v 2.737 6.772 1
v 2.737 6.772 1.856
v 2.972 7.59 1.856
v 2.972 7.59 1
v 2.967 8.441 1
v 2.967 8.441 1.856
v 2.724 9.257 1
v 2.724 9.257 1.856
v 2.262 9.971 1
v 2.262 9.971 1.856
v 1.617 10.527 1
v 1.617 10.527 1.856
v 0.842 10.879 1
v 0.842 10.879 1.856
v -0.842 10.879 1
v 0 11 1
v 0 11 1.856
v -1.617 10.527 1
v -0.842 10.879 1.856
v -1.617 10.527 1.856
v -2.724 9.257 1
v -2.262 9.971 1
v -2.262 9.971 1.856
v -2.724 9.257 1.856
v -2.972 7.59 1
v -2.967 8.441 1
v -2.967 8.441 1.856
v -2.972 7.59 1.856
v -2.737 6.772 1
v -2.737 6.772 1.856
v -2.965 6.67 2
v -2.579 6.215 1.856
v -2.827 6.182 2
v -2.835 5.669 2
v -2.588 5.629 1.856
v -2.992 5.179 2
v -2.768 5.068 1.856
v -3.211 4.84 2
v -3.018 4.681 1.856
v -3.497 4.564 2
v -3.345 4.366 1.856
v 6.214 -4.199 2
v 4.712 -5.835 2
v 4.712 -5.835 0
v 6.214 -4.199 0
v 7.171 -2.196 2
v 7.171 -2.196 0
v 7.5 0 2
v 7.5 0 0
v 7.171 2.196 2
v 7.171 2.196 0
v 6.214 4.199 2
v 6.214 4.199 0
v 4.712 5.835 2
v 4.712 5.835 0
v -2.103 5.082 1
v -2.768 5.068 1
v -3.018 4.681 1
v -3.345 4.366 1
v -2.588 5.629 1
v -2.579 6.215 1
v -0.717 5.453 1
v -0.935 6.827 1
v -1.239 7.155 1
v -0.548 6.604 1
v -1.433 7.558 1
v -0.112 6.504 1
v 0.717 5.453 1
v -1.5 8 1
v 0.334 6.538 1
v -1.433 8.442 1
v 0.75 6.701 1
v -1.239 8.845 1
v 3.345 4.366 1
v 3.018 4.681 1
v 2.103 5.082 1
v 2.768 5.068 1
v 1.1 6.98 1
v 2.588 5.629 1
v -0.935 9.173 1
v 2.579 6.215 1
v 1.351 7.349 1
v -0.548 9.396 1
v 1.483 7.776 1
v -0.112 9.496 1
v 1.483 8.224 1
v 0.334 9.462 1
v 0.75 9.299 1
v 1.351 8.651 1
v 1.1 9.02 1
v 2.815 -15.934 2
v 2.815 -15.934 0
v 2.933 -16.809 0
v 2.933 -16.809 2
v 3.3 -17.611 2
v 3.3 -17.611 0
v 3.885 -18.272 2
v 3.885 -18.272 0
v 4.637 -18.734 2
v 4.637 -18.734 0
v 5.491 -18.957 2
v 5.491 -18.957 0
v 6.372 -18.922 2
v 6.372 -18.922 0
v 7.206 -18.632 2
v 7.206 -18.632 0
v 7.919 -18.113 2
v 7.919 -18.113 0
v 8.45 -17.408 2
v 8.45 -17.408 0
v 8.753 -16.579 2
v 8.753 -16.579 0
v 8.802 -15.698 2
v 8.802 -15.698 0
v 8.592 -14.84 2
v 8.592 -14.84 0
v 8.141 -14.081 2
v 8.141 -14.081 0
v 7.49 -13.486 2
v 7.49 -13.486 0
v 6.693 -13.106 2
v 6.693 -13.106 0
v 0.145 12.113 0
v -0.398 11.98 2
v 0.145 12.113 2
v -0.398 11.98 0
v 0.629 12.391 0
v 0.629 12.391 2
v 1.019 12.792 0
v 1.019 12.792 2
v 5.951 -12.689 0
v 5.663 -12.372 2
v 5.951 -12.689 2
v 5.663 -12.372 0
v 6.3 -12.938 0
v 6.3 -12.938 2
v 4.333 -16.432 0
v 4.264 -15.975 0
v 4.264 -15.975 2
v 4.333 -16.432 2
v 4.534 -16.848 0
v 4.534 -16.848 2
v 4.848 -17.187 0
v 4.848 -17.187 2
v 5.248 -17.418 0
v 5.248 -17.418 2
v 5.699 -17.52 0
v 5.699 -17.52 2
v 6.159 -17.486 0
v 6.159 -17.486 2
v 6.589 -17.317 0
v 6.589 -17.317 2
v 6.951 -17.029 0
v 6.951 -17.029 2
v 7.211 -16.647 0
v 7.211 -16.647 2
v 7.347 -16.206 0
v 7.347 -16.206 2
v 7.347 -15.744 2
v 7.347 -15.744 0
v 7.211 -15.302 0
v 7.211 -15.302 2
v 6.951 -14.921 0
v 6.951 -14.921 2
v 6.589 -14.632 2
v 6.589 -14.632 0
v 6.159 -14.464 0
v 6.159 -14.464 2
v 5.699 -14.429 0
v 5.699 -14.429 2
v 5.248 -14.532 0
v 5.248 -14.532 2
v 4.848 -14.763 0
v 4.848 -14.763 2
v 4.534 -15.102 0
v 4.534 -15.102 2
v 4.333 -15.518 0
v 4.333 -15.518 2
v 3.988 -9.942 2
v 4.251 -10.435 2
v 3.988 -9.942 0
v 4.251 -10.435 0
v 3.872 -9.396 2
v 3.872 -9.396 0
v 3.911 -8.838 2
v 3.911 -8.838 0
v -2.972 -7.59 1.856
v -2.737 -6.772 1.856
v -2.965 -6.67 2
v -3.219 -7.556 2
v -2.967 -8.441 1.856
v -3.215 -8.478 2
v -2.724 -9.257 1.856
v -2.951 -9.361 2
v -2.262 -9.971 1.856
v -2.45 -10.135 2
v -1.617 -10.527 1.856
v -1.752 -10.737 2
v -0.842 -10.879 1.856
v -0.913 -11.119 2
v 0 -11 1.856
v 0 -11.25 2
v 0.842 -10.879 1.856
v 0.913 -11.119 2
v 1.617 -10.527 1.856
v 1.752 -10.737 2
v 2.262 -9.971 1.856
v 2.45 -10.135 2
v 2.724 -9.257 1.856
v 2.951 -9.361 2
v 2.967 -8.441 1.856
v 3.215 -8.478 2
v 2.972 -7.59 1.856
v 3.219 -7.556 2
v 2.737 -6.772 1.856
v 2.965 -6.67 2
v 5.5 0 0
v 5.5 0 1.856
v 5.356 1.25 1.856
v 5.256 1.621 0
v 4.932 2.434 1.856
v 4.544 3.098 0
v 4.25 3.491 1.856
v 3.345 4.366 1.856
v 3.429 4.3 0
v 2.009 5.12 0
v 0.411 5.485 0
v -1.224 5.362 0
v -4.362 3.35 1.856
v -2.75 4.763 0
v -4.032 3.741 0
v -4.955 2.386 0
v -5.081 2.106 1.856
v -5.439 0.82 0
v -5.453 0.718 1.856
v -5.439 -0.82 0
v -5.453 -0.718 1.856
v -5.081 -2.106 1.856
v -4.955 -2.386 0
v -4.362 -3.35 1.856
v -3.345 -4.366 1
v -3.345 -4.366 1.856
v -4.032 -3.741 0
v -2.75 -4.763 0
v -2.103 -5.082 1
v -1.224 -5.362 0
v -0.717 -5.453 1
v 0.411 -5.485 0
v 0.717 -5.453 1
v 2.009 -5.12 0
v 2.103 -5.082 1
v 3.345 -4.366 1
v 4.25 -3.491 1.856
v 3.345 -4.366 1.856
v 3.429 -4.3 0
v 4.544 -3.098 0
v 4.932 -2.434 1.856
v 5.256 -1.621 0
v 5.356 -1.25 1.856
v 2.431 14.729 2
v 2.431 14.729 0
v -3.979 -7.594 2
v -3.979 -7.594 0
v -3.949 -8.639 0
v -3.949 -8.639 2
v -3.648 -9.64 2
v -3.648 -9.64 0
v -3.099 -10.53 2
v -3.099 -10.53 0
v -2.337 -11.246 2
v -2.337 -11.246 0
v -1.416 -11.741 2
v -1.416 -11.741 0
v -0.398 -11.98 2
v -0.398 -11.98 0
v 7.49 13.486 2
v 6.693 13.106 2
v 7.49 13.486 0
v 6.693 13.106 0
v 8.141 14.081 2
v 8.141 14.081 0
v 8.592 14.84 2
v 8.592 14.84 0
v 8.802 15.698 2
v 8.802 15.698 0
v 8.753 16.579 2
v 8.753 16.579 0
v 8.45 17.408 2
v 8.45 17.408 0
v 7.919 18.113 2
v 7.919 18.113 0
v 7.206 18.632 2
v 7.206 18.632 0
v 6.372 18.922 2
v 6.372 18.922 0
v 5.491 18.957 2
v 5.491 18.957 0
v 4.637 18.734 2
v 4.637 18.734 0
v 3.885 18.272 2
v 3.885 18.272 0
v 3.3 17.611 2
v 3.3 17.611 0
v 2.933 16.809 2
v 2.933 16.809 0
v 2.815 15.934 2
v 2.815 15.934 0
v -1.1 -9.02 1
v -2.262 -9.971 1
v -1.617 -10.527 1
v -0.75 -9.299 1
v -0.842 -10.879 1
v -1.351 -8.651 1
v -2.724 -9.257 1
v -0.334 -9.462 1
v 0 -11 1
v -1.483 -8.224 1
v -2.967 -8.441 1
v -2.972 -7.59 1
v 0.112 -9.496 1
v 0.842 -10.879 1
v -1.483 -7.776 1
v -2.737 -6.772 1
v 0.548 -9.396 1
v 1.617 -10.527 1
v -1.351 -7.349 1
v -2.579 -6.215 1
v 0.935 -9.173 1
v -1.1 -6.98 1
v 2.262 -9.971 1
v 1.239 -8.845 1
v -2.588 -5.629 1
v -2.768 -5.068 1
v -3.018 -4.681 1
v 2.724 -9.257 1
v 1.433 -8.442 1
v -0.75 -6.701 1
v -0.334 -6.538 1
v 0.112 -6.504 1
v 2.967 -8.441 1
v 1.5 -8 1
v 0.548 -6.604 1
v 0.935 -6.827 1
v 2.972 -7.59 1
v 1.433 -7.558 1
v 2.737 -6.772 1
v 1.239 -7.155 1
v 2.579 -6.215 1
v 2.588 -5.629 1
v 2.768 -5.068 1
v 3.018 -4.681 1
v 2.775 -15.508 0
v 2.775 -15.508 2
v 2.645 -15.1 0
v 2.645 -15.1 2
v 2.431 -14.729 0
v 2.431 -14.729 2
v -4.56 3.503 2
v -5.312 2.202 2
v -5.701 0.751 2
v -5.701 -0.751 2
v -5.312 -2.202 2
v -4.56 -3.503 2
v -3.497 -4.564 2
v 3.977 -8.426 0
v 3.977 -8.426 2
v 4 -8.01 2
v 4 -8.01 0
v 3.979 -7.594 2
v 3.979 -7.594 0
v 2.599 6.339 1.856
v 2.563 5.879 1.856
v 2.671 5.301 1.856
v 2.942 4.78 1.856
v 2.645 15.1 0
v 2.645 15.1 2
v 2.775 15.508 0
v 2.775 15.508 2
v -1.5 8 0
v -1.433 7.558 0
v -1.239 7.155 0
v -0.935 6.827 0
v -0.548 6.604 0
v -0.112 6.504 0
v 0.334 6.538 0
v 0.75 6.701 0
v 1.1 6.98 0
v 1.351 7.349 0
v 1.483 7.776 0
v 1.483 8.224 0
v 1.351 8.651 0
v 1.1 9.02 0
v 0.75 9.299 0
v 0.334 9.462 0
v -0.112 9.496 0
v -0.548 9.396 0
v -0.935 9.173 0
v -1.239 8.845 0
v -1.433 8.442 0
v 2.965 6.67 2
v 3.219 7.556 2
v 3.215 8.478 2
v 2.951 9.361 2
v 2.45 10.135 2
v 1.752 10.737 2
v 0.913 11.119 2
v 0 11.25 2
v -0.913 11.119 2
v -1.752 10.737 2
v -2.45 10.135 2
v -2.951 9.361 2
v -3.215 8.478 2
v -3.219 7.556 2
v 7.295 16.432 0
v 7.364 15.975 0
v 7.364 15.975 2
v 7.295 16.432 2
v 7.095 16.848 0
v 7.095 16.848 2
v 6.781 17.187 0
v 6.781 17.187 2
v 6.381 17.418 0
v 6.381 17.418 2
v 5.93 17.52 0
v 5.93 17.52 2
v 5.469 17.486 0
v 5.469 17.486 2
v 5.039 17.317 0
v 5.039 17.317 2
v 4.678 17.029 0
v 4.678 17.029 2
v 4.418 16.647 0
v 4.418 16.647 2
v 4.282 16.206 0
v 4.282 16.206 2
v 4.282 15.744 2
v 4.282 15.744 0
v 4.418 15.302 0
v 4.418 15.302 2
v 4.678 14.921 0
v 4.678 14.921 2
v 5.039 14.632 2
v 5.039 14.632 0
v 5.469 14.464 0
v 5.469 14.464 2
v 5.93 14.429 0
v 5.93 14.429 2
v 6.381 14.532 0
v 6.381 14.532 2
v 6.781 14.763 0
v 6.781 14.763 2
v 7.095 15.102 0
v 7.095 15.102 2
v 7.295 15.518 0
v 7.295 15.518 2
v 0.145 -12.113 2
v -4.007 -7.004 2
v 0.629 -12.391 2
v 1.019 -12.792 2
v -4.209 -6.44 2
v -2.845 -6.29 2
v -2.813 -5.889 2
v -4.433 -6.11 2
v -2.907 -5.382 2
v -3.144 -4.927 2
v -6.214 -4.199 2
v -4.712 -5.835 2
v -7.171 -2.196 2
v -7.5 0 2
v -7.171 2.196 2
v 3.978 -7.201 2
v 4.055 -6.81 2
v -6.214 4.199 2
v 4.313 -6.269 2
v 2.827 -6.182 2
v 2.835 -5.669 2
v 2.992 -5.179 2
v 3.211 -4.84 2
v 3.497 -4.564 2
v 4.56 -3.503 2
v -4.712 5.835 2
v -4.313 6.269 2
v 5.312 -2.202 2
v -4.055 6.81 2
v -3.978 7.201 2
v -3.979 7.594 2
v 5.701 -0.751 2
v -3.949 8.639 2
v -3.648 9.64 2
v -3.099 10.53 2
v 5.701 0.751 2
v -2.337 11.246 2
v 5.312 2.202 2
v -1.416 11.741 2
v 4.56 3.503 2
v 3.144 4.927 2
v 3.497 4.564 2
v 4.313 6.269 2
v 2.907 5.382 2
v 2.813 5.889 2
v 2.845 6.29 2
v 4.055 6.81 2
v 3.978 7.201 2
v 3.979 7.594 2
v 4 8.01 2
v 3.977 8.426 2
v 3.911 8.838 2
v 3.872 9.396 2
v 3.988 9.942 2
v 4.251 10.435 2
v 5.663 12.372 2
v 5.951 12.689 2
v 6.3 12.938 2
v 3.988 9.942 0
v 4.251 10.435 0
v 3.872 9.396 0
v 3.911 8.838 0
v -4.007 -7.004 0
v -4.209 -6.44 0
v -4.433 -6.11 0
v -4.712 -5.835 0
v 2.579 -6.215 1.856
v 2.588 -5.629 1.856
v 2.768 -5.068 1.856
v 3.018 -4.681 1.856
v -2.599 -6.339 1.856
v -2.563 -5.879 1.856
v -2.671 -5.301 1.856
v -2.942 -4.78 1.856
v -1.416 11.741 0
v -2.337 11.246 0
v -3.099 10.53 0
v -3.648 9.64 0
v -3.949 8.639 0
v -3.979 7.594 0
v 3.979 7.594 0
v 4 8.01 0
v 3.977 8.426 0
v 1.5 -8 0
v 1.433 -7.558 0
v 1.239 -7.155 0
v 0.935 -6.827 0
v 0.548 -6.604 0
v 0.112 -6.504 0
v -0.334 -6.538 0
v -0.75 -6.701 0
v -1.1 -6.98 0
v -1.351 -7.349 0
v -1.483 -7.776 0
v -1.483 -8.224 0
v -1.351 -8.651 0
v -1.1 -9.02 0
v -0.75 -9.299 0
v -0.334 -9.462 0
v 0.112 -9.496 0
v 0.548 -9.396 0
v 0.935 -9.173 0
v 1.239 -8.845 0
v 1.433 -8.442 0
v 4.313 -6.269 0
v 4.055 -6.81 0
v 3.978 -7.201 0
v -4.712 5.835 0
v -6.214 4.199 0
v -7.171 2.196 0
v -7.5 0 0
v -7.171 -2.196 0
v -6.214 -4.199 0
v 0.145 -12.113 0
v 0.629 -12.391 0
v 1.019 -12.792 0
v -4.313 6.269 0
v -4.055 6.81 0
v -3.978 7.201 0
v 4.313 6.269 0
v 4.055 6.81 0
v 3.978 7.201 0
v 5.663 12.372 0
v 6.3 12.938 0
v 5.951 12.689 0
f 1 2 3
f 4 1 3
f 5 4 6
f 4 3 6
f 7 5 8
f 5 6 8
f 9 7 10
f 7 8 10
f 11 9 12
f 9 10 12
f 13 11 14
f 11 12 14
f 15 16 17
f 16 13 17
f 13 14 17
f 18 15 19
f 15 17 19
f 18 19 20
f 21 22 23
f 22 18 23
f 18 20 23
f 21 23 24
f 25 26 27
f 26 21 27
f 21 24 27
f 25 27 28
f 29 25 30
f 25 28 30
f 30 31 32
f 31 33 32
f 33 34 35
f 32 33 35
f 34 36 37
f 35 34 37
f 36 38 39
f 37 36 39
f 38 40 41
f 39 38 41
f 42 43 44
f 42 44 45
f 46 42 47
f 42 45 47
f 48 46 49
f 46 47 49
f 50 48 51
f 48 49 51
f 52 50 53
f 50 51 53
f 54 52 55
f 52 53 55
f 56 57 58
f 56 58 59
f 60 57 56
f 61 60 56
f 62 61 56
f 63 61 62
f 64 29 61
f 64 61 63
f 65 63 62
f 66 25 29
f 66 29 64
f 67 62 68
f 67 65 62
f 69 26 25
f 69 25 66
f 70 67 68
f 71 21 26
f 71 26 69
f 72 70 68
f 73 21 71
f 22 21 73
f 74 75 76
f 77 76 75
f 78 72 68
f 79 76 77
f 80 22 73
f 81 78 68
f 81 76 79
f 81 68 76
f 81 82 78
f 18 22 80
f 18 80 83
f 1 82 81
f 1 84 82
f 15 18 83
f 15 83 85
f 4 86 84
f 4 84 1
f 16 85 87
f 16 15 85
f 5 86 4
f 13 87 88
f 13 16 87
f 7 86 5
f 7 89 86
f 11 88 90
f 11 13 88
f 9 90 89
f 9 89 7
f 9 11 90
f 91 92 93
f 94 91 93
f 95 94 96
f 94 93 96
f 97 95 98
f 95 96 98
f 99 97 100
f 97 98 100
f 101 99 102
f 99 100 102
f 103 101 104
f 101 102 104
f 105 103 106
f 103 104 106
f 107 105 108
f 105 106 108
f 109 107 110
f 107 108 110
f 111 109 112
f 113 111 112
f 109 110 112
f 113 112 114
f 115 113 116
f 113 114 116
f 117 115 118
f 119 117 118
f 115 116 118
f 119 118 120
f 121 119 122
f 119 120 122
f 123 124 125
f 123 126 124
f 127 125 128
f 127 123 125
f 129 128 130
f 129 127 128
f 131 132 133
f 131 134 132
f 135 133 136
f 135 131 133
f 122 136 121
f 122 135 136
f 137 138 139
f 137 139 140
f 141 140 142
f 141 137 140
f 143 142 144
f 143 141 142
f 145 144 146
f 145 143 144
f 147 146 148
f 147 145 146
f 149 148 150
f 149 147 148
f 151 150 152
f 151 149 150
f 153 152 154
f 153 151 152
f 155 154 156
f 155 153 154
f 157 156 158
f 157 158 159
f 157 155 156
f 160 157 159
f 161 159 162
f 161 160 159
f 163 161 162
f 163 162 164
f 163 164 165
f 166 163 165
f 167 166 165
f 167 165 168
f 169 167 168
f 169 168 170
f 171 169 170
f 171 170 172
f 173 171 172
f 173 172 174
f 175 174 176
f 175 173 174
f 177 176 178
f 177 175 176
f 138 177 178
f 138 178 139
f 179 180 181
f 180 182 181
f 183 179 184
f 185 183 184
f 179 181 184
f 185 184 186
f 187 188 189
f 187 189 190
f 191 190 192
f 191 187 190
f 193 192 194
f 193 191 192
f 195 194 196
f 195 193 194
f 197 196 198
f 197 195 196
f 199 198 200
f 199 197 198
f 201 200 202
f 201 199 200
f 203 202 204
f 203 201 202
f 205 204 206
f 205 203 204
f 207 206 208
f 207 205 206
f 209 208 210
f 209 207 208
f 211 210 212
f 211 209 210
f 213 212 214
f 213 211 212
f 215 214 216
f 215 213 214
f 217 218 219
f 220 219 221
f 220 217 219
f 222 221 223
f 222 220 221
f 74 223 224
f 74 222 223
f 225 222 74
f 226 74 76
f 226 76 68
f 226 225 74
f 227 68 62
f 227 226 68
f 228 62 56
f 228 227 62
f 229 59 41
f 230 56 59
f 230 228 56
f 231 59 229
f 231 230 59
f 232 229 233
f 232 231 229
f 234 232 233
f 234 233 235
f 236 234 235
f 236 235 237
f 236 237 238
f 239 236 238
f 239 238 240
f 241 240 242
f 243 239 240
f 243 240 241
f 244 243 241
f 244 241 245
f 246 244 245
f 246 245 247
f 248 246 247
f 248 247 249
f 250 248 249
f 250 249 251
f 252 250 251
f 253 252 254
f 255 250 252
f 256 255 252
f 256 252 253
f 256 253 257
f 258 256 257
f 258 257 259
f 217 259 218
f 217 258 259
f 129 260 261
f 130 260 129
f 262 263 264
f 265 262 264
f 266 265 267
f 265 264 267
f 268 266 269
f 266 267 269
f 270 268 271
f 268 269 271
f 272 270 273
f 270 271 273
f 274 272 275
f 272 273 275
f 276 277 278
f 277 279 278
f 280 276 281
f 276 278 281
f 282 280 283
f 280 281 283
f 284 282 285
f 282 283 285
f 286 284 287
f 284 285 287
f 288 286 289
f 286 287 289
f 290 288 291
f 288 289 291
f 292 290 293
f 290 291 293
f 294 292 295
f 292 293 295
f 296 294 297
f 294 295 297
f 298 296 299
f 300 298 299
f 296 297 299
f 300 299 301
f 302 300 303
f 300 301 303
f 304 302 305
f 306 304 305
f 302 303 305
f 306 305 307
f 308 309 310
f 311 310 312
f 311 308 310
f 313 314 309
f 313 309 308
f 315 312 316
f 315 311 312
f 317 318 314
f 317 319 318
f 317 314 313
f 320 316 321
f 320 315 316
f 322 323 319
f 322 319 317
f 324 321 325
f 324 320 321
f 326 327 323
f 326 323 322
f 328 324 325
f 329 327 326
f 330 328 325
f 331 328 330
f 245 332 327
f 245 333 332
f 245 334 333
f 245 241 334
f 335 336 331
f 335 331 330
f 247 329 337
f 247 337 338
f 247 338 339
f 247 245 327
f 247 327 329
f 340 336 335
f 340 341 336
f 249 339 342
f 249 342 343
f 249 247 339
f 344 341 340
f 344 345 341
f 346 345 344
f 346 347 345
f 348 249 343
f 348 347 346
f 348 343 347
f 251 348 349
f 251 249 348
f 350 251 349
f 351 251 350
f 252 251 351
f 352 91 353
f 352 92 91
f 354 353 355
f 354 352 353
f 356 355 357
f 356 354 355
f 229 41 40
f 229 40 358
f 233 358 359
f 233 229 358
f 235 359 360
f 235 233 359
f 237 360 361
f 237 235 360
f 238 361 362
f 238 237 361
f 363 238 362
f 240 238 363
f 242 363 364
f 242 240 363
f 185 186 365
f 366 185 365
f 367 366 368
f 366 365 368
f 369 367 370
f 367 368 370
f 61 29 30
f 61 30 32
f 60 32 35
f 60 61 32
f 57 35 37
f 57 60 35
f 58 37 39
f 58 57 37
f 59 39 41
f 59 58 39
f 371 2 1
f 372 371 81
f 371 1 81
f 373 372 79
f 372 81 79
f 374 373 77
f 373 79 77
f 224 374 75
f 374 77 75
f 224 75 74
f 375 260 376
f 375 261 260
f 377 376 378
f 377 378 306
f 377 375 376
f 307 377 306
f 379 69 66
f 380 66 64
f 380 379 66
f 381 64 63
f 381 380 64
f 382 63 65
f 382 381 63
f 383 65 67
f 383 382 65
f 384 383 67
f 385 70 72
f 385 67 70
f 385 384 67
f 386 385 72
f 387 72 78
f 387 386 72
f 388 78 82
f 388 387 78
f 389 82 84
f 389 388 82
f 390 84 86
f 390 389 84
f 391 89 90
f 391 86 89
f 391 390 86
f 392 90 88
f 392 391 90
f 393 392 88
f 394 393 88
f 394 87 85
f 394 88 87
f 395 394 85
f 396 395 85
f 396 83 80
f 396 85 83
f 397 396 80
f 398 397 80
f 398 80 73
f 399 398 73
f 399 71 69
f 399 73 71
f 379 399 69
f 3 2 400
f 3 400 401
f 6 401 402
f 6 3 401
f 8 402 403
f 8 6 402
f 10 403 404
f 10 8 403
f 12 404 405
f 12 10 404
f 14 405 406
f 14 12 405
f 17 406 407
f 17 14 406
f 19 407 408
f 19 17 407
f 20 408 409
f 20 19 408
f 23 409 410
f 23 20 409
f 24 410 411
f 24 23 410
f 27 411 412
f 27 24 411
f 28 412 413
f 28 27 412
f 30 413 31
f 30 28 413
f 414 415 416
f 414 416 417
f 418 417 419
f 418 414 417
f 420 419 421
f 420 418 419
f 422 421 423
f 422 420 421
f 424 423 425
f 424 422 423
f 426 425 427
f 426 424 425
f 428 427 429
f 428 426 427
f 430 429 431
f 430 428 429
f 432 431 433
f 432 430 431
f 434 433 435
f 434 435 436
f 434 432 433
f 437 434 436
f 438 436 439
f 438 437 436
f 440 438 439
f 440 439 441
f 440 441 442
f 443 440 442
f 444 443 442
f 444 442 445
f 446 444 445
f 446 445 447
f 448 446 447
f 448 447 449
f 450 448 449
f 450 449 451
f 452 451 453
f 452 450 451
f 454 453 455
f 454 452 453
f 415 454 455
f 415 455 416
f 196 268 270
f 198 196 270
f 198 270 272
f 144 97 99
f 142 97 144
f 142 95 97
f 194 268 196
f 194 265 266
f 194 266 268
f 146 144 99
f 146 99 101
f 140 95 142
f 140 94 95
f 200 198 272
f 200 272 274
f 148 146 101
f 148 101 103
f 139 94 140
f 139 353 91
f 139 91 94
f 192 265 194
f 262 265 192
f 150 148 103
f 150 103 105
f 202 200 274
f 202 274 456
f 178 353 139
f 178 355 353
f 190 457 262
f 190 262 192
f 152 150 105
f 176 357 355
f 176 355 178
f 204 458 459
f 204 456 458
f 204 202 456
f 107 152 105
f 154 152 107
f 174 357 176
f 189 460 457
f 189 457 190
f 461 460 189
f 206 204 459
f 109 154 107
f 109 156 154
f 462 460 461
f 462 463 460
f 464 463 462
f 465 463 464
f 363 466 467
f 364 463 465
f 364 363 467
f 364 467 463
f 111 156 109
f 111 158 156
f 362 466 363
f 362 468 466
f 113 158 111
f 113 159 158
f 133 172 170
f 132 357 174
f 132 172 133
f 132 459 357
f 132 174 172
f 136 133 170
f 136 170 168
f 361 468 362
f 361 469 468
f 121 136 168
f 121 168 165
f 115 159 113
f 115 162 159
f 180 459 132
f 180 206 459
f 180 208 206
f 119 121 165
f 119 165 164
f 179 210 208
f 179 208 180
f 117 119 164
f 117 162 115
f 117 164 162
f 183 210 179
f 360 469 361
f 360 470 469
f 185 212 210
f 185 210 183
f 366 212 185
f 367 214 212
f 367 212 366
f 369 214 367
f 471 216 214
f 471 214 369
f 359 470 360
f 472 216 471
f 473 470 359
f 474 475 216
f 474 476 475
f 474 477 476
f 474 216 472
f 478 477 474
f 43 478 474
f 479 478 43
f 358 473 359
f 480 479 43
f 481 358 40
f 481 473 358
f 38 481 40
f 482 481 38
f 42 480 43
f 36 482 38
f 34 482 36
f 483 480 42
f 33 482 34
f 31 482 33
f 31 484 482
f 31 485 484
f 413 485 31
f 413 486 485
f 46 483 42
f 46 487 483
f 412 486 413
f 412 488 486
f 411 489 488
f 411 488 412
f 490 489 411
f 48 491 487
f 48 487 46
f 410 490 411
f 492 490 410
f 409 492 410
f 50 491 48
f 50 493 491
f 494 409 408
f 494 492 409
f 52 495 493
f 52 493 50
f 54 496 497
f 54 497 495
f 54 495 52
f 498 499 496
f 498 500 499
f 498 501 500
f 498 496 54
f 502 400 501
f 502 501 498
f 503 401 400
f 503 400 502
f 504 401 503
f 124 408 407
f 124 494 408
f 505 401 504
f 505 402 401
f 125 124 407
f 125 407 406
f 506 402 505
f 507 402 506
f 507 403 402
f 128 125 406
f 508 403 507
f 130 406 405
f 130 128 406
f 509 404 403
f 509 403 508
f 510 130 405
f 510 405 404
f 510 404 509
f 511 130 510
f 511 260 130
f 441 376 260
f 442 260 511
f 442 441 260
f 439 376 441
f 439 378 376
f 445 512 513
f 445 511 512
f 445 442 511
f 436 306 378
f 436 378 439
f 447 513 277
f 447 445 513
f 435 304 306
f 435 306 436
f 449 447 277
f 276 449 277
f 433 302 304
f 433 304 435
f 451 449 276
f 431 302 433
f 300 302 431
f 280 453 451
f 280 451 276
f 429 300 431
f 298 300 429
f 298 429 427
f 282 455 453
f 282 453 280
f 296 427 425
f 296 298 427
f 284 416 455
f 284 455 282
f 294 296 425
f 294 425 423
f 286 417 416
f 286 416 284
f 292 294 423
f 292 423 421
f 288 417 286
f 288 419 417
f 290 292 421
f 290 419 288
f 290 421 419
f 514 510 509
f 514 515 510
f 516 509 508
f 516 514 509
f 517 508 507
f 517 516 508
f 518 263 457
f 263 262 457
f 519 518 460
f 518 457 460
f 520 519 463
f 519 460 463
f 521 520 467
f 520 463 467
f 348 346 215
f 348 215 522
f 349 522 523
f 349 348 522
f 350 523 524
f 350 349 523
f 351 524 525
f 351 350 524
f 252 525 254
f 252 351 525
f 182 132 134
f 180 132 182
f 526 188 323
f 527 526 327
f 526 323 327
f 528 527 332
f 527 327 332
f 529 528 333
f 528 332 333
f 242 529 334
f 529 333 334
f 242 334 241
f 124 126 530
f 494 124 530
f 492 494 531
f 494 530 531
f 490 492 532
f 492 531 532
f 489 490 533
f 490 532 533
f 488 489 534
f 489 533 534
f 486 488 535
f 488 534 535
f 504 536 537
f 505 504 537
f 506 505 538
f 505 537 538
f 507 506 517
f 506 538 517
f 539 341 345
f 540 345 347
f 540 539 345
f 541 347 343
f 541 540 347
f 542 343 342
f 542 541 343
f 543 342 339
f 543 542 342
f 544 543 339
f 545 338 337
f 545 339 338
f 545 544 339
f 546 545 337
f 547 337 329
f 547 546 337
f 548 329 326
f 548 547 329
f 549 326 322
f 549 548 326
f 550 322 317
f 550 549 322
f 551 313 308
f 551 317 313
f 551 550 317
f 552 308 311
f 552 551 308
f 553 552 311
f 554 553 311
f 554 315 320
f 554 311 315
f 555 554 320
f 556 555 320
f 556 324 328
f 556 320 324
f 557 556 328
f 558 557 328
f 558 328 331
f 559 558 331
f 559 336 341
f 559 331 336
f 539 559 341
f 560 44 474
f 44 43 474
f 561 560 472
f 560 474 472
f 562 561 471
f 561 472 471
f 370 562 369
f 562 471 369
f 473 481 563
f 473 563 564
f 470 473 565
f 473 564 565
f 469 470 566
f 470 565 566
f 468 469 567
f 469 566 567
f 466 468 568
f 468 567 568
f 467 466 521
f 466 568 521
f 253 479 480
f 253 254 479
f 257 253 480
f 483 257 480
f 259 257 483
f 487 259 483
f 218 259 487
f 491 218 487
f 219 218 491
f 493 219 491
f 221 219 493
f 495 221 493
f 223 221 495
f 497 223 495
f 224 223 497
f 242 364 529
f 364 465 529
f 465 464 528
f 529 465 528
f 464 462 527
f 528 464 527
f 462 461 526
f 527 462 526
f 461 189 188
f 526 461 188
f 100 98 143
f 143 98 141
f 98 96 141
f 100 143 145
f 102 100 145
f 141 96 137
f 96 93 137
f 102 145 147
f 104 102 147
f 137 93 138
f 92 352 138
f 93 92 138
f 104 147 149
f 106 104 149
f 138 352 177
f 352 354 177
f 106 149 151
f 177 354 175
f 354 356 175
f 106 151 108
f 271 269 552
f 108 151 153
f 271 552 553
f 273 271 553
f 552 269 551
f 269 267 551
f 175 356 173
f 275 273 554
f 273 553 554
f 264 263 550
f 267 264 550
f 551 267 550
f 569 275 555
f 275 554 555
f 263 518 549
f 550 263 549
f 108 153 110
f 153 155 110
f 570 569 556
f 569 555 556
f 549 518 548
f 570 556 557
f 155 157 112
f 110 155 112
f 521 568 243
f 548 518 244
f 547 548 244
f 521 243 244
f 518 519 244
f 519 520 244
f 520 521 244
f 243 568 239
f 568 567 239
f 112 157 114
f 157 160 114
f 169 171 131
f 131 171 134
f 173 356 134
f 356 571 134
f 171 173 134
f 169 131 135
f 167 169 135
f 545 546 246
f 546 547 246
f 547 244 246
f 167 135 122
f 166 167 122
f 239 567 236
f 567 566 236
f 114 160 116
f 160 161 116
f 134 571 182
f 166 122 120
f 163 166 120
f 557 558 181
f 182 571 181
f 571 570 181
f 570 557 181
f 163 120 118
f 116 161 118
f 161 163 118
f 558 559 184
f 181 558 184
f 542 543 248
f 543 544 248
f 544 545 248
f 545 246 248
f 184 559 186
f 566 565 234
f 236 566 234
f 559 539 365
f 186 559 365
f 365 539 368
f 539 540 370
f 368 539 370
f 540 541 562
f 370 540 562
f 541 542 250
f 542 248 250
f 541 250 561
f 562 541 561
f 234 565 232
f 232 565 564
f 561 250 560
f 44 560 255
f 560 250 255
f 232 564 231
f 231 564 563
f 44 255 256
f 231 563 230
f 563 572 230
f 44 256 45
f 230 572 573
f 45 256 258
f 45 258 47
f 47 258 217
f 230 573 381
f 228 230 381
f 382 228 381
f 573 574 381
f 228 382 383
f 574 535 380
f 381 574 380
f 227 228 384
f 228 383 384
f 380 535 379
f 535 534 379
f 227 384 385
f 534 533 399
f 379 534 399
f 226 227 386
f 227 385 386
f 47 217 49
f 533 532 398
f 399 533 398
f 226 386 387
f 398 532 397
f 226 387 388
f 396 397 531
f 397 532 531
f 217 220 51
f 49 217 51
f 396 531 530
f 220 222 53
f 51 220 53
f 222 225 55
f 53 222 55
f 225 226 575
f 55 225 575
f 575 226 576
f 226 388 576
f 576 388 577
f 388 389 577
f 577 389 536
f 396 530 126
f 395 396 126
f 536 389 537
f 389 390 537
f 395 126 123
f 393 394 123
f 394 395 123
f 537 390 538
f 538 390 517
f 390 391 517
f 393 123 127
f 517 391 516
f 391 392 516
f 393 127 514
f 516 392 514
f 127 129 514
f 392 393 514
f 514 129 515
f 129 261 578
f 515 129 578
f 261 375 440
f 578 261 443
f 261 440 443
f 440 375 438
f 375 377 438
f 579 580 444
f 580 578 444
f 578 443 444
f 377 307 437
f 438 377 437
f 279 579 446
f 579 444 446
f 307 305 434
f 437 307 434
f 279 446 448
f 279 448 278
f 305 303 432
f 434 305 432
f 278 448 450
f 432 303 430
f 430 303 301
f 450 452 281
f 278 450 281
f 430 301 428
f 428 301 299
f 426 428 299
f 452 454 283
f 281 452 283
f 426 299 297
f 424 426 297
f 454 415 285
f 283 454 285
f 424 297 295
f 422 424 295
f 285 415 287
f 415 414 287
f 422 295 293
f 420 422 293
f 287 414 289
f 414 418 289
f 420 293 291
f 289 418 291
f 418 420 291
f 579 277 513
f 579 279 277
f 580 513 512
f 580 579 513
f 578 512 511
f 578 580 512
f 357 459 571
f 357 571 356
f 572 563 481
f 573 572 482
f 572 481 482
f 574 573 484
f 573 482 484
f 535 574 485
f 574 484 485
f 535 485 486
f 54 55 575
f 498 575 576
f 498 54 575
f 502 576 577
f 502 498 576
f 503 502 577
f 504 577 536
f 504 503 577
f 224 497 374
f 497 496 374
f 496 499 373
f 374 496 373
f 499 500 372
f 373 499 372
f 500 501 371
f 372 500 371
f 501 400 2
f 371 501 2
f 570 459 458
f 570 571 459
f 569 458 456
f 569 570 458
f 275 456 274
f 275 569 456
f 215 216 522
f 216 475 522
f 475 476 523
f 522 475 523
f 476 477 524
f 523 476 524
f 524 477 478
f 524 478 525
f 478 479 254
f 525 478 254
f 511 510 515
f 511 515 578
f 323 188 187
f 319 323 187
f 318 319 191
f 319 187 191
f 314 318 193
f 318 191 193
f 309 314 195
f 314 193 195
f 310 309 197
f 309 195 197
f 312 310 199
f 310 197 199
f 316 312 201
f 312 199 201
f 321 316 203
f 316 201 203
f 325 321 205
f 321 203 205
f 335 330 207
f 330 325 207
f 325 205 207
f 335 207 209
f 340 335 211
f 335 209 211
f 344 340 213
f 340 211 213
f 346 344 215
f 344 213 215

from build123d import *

# Parameters (mm, degrees)
SKETCH_1_R          = 3
SKETCH_1_R_2        = 1.55
EXTRUDE_1_DEPTH     = 2
EXTRUDE_1_2_DEPTH   = 2
SKETCH_1_R_3        = 5.5
SKETCH_1_R_4        = 1.5
EXTRUDE_1_3_DEPTH   = 2
EXTRUDE_2_DEPTH     = 2
SKETCH_3_R          = 3
CUT_EXTRUDE_1_DEPTH = 1
FILLET_2_R          = 2
CHAMFER_1_SIZE      = 0.25
CHAMFER_1_SIZE2     = 0.144337567


with BuildPart() as part:
    # ｽｹｯﾁ1 → ﾎﾞｽ - 押し出し1 (new body)
    with BuildSketch(Plane.XY):
        with Locations((5.814342437, 15.974774553)):
            Circle(SKETCH_1_R)
        with Locations((5.814342437, 15.974774553)):
            Circle(SKETCH_1_R_2, mode=Mode.SUBTRACT)
    extrude(amount=EXTRUDE_1_DEPTH)



with BuildPart() as body_2:
    # ｽｹｯﾁ1 → Extrude 1 2 (new body)
    with BuildSketch(Plane.XY):
        with Locations(Location((5.814342437, -15.974774553, 0), (0, 0, 180))):
            Circle(SKETCH_1_R)
        with Locations(Location((5.814342437, -15.974774553, 0), (0, 0, 180))):
            Circle(SKETCH_1_R_2, mode=Mode.SUBTRACT)
    extrude(amount=EXTRUDE_1_2_DEPTH)


with BuildPart() as body_3:
    # ｽｹｯﾁ1 → Extrude 1 3 (new body)
    with BuildSketch(Plane.XY):
        with BuildLine():
            ThreePointArc((3.714381625, -6.515625), (7.5, 0), (3.714381625, 6.515625))
            ThreePointArc((3.714381625, 6.515625), (0, 12), (-3.714381625, 6.515625))
            ThreePointArc((-3.714381625, 6.515625), (-7.5, 0), (-3.714381625, -6.515625))
            ThreePointArc((-3.714381625, -6.515625), (0, -12), (3.714381625, -6.515625))
        make_face()
        Circle(SKETCH_1_R_3, mode=Mode.SUBTRACT)
        with Locations((0, -8)):
            Circle(SKETCH_1_R_4, mode=Mode.SUBTRACT)
        with Locations(Location((0, 8, 0), (0, 0, 180))):
            Circle(SKETCH_1_R_4, mode=Mode.SUBTRACT)
    extrude(amount=EXTRUDE_1_3_DEPTH)


with BuildPart() as part_1:
    add(part.part)

    add(body_2.part)  # ﾎﾞｽ - 押し出し2 merges body 2

    add(body_3.part)  # ﾎﾞｽ - 押し出し2 merges body 3
    # ｽｹｯﾁ2 → ﾎﾞｽ - 押し出し2 (add, through all)
    with BuildSketch(Plane.XY.offset(2)):
        with BuildLine():
            Line((4.046944512, 13.550665526), (2.356530565, 11.23214537))
            ThreePointArc((2.356530565, 11.23214537), (3.112774512, 10.512097697), (3.65688802, 9.620854717))
            Line((3.65688802, 9.620854717), (6.113074488, 12.98968508))
            ThreePointArc((6.113074488, 12.98968508), (5.028263798, 13.079592284), (4.046944512, 13.550665526))
        make_face()
        with BuildLine():
            ThreePointArc((0.424742649, 11.977385282), (1.439692955, 11.731927678), (2.356530565, 11.23214537))
            Line((2.356530565, 11.23214537), (4.046944512, 13.550665526))
            ThreePointArc((4.046944512, 13.550665526), (3.2983125, 14.340885525), (2.880929118, 15.346215646))
            Line((2.880929118, 15.346215646), (0.424742649, 11.977385282))
        make_face()
        with BuildLine():
            ThreePointArc((3.65688802, -9.620854717), (2.356530565, -11.23214537), (0.424742649, -11.977385282))
            Line((0.424742649, -11.977385282), (2.880929118, -15.346215646))
            ThreePointArc((2.880929118, -15.346215646), (4.046944512, -13.550665526), (6.113074488, -12.98968508))
            Line((6.113074488, -12.98968508), (3.65688802, -9.620854717))
        make_face()
    extrude(amount=-EXTRUDE_2_DEPTH)

    # ｽｹｯﾁ3 → ｶｯﾄ - 押し出し1 (cut)
    with BuildSketch(Plane.XY.offset(2)):
        with Locations((0, 8)):
            Circle(SKETCH_3_R)
        with Locations((0, -8)):
            Circle(SKETCH_3_R)
    extrude(amount=-CUT_EXTRUDE_1_DEPTH, mode=Mode.SUBTRACT)

    # ﾌｨﾚｯﾄ2
    fillet_2_edges = [part_1.edges().sort_by_distance(p)[0] for p in [
        (2.880929118, 15.346215646, 1),
        (6.113074488, 12.98968508, 1),
        (3.65688802, 9.620854717, 1),
        (0.424742649, 11.977385282, 1),
        (2.880929118, -15.346215646, 1),
        (0.424742649, -11.977385282, 1),
        (3.65688802, -9.620854717, 1),
        (6.113074488, -12.98968508, 1),
        (-1.36421552, 5.328125, 1.5),
        (1.36421552, 5.328125, 1.5),
        (3.714381625, 6.515625, 1),
        (1.36421552, -5.328125, 1.5),
        (3.714381625, -6.515625, 1),
        (-1.36421552, -5.328125, 1.5),
        (-3.714381625, -6.515625, 1),
        (-3.714381625, 6.515625, 1),
    ]]
    fillet(fillet_2_edges, radius=FILLET_2_R)

    # 面取り1
    chamfer_1_edges = [part_1.edges().sort_by_distance(p)[0] for p in [
        (-2.622819565, 5.462987902, 2),
        (-2.622819565, -5.462987902, 2),
        (2.622819565, 5.462987902, 2),
        (2.622819565, -5.462987902, 2),
        (0, -11, 2),
        (4.932006961, 2.434195419, 2),
        (-5.5, 0, 2),
        (0, 11, 2),
    ]]
    chamfer_1_side = [part_1.faces().sort_by_distance(p)[0] for p in [
        (7.086923001, 0, 2),
    ]]
    chamfer(chamfer_1_edges, length=CHAMFER_1_SIZE, length2=CHAMFER_1_SIZE2, reference=chamfer_1_side[0])


solid = part_1.part
